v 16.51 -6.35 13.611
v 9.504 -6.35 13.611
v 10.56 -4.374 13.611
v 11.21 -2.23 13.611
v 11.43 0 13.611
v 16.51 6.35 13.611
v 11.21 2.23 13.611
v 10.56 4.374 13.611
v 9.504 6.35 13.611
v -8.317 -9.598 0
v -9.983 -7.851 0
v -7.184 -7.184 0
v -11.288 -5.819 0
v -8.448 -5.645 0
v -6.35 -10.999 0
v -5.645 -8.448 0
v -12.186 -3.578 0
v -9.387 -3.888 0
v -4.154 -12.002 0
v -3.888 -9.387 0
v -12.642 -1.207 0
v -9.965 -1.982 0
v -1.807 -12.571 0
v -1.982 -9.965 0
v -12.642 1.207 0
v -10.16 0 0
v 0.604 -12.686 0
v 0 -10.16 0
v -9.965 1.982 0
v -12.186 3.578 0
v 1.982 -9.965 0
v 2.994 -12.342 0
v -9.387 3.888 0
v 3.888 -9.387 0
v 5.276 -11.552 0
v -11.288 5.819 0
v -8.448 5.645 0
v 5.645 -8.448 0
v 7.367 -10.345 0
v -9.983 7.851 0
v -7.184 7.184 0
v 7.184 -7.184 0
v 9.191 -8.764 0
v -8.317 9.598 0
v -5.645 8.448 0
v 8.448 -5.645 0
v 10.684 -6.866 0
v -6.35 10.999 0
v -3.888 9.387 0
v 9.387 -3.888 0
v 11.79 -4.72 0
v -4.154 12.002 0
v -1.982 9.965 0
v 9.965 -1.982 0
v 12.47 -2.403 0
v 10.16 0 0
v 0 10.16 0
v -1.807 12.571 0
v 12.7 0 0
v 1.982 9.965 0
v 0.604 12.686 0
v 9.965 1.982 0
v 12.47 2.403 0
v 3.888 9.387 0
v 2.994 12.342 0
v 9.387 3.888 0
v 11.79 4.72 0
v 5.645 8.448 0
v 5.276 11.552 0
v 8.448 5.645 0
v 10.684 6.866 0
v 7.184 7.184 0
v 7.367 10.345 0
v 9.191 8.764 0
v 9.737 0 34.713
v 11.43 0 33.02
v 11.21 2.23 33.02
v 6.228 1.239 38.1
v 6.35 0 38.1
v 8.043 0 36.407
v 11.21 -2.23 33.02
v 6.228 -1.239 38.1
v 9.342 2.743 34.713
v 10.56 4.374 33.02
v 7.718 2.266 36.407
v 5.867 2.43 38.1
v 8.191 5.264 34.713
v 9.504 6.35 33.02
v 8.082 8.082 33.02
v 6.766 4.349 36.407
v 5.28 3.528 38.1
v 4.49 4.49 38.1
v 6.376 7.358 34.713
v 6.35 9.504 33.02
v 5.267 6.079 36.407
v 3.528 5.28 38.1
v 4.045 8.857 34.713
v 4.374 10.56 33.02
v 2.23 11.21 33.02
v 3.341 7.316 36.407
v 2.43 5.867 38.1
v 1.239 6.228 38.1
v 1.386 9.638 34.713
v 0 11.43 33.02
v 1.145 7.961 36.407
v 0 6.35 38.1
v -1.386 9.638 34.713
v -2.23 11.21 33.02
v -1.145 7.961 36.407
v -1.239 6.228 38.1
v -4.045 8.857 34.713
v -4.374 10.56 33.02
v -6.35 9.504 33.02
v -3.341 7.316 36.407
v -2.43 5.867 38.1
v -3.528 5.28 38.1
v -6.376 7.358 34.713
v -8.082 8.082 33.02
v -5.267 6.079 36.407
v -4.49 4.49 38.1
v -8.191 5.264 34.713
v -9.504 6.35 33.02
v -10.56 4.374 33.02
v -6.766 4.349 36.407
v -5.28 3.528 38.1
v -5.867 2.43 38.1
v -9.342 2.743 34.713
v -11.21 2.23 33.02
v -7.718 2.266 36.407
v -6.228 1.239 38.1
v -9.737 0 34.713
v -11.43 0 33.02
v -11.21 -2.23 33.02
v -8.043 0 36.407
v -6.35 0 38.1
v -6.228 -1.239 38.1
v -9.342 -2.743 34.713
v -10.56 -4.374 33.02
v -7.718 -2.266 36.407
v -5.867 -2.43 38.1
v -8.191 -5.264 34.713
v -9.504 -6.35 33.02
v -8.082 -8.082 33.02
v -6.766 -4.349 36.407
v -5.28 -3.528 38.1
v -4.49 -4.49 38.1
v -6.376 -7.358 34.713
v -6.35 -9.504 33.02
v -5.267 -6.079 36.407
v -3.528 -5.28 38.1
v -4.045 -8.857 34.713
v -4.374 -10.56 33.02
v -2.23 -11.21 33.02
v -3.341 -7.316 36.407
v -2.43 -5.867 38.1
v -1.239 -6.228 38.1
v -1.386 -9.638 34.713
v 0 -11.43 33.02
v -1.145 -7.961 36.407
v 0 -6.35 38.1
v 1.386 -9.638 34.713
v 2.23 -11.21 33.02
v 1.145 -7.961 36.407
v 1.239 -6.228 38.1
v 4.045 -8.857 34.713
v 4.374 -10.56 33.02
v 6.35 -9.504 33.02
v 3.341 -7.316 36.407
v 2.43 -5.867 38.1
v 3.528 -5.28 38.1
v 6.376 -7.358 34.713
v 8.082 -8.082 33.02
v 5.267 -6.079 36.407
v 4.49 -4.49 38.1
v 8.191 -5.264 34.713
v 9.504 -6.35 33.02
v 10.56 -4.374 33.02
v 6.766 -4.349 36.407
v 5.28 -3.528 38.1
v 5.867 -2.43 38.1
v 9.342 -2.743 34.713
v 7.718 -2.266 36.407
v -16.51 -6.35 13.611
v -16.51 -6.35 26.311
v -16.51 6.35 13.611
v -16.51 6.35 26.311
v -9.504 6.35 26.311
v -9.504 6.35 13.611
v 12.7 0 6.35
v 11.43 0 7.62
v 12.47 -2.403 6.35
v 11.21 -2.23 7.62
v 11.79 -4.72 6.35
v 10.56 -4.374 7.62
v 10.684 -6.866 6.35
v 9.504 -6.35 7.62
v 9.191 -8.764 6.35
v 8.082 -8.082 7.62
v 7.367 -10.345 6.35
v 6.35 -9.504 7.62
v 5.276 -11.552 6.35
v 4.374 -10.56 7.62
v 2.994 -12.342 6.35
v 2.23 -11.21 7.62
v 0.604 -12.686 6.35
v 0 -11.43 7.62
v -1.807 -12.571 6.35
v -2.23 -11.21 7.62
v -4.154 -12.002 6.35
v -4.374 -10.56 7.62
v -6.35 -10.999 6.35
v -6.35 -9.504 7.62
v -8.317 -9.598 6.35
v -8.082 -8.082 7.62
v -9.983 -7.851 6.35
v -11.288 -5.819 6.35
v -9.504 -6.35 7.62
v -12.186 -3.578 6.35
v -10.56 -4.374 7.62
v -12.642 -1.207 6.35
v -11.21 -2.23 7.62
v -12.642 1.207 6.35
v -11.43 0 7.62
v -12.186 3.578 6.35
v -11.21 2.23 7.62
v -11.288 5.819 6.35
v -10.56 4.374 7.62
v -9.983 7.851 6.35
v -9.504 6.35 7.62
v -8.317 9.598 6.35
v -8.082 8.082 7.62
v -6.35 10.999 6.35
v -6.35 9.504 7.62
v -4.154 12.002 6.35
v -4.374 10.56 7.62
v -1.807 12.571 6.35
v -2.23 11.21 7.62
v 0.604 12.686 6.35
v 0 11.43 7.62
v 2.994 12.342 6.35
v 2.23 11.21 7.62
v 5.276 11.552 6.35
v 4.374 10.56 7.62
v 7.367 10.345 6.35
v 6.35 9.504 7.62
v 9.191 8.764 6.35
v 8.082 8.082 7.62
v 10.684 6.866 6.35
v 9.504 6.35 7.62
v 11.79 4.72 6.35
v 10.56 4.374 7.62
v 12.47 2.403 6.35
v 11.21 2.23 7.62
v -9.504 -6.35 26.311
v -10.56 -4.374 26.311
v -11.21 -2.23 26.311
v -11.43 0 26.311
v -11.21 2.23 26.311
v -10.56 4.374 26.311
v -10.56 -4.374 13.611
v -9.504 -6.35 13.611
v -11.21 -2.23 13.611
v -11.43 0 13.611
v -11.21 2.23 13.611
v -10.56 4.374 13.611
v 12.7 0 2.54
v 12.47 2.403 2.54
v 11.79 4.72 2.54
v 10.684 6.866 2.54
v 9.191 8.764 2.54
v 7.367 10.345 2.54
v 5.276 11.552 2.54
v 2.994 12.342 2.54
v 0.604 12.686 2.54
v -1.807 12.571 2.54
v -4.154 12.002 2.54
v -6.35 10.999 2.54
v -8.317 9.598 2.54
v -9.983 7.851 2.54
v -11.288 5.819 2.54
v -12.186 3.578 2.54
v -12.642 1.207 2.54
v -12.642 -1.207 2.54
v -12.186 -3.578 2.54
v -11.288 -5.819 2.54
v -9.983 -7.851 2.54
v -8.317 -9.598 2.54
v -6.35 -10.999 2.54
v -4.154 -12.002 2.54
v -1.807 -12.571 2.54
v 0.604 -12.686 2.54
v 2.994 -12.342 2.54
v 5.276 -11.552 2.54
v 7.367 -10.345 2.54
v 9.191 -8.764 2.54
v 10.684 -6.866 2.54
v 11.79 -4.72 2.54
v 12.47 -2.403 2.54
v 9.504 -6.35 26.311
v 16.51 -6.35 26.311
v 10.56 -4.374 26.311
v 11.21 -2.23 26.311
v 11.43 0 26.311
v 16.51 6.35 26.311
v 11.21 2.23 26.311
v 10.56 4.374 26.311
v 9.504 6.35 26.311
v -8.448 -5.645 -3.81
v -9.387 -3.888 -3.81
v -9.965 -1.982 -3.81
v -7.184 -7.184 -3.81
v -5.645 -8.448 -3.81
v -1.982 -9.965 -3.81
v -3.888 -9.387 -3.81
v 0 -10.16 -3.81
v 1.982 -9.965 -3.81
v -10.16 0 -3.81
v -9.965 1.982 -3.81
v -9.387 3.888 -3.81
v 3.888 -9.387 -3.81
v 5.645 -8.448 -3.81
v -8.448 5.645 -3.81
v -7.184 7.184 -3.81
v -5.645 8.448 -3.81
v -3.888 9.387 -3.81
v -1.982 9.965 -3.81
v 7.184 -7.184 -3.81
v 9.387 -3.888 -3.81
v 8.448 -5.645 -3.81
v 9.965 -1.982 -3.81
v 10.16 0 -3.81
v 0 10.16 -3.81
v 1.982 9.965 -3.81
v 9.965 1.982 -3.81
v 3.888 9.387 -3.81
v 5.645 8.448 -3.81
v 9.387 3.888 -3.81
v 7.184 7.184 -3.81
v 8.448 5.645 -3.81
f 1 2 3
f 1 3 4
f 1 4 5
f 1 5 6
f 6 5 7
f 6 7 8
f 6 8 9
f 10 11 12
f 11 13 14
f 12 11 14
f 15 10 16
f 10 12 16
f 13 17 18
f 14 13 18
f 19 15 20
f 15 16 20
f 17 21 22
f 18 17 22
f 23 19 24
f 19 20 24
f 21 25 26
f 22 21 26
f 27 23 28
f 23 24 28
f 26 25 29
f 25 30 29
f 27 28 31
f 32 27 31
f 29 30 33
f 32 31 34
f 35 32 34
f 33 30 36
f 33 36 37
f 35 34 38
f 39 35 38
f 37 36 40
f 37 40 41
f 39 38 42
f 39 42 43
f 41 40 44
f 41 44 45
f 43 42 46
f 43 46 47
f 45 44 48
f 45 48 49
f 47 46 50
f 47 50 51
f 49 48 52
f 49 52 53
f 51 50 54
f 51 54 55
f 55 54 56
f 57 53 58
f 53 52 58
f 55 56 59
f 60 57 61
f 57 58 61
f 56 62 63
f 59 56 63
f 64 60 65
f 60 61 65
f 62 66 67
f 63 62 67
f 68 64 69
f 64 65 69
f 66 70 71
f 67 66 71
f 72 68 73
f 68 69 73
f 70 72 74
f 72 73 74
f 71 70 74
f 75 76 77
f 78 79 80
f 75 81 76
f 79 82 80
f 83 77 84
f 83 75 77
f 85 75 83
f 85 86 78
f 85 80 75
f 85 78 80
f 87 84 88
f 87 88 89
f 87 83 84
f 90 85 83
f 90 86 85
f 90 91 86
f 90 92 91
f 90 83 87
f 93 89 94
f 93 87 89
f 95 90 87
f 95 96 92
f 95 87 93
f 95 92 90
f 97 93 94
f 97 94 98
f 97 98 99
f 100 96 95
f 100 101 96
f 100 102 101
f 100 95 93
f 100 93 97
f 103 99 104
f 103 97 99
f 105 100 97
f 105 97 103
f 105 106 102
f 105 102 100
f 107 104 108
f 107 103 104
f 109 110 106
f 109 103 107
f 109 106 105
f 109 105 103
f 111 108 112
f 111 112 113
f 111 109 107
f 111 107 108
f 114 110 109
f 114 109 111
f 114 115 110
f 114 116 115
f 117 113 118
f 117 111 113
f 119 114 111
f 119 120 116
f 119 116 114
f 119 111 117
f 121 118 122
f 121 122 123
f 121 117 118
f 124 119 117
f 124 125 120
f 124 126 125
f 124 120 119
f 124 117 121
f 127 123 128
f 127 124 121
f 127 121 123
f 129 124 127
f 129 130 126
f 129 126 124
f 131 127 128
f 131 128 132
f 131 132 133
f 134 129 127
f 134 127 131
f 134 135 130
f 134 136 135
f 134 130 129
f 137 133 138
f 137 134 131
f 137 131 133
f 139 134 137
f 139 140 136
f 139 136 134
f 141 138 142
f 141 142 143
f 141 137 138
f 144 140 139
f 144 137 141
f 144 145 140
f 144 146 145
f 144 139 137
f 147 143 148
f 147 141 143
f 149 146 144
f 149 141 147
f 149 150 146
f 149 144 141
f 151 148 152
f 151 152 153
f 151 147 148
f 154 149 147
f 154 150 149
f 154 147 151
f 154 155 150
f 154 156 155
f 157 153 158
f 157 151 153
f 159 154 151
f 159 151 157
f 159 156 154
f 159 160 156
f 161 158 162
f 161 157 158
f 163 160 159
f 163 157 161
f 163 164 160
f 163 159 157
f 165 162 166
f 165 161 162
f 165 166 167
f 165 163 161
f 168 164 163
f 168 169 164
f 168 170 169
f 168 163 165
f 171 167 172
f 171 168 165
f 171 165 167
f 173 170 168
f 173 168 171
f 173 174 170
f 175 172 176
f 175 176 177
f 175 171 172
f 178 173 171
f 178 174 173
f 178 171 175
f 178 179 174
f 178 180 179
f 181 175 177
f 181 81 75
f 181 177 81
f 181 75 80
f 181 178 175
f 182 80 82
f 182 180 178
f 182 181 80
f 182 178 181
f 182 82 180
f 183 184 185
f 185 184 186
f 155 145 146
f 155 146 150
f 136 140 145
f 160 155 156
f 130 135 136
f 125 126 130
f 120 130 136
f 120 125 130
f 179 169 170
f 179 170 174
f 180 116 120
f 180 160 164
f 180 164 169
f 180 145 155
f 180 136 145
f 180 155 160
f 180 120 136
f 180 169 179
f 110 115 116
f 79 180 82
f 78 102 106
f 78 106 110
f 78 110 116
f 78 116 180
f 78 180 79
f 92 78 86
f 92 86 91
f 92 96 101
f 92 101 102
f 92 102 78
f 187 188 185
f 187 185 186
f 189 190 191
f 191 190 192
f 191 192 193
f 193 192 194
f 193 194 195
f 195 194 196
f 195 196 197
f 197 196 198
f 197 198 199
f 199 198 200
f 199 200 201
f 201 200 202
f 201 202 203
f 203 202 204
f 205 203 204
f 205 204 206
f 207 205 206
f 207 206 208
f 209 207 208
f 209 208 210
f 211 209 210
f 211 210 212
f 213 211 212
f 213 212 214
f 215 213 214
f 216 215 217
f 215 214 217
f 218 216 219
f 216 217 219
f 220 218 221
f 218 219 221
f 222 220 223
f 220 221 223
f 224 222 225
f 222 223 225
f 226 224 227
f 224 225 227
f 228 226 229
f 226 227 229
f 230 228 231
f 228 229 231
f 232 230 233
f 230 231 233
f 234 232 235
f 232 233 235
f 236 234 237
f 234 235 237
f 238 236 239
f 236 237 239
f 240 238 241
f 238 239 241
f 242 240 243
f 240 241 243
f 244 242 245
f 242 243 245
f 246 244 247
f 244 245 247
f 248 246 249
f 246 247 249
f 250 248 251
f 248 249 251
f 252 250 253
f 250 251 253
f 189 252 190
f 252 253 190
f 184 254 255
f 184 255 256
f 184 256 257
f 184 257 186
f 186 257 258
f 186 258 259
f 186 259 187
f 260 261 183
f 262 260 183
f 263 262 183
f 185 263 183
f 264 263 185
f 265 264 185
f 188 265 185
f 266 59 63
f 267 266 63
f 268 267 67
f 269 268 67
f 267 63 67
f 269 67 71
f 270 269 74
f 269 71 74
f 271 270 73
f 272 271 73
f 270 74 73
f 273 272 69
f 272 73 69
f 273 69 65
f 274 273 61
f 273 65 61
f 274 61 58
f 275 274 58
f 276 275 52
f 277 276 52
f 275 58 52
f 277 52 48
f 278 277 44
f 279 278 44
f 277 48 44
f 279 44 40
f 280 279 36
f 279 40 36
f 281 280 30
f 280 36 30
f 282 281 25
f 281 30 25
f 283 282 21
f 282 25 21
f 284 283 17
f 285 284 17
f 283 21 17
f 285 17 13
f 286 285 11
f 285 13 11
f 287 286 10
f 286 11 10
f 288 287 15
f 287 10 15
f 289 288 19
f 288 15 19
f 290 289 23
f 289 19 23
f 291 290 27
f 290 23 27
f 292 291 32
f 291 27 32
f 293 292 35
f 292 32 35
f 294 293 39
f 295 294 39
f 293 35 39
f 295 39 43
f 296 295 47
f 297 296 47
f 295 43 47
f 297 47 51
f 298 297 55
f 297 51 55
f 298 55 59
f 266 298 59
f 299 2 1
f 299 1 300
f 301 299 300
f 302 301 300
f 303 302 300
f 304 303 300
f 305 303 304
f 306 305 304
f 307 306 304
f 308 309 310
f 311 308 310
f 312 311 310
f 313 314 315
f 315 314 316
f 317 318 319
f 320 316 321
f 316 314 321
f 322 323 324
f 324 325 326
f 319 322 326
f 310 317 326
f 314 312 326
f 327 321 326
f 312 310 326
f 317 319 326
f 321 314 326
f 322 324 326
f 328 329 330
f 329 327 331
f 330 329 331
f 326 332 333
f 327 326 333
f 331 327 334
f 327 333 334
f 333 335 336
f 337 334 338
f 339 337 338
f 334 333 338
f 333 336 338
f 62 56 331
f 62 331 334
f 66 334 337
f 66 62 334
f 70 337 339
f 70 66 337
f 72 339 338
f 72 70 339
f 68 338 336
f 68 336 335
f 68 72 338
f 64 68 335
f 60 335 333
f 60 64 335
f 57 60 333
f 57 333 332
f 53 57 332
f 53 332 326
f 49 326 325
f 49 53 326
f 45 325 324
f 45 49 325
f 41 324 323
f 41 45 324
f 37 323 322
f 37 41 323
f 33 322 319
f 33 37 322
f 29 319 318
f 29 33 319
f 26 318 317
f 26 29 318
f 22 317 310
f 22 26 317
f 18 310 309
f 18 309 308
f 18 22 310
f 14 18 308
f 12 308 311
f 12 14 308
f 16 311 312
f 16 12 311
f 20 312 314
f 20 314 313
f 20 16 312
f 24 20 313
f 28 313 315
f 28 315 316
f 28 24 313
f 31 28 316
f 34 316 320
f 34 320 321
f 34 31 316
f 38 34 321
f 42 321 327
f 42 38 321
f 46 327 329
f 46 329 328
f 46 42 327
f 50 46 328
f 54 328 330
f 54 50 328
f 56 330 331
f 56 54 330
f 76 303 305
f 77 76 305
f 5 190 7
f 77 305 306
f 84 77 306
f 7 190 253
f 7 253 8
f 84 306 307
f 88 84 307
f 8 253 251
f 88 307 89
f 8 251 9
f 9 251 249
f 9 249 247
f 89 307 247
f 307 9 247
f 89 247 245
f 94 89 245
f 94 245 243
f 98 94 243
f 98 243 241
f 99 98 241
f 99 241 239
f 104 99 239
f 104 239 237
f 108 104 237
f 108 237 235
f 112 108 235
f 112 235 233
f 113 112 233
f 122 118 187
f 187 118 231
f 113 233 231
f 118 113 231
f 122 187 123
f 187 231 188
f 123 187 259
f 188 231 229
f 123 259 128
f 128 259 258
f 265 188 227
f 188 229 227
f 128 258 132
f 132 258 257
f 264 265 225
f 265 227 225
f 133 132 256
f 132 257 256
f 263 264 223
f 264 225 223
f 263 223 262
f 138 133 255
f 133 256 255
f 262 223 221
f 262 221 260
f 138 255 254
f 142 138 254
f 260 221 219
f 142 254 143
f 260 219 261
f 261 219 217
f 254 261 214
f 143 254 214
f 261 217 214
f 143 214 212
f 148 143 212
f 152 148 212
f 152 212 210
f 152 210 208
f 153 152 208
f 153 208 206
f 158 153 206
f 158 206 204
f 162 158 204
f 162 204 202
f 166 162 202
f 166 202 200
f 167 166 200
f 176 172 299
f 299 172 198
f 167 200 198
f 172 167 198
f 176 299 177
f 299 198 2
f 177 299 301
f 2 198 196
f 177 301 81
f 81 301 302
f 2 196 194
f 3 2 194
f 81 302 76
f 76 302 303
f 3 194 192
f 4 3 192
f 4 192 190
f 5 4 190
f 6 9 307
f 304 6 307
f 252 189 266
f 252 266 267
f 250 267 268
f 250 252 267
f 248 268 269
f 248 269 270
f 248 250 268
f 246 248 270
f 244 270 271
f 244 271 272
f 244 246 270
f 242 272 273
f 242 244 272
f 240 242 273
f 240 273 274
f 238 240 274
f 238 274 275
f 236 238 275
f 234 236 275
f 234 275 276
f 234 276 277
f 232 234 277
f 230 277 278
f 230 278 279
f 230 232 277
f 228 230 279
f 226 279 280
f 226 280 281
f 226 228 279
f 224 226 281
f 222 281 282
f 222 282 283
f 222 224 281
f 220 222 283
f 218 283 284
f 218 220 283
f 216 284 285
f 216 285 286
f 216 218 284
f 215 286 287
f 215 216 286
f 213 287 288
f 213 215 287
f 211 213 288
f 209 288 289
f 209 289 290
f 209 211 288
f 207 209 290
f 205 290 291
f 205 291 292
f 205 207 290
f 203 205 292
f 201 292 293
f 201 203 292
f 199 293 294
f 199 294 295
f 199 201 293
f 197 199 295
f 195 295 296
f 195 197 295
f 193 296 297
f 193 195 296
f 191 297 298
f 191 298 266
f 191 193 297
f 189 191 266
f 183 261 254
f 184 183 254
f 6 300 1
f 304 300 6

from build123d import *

# Parameters (mm, degrees)
F0_R        = 10.16
F1_DEPTH    = 3.81
F2_R        = 12.7
F3_DEPTH    = 2.54
F4_R        = 11.43
F5_DEPTH    = 38.1
F6_S5_R     = 12.7
F6_T6_DEPTH = 25
F7_W        = 12.7
F7_H        = 12.7
F8_DEPTH    = 16.51
F9_W        = 12.7
F9_H        = 12.7
F10_DEPTH   = 16.51


# Not quite as in the source:
# - a fillet or chamfer that OpenCascade refuses, or shapes differently, is made with other operations: its cross-section is extruded or revolved along the edge and cut away or added


with BuildPart() as f1:
    # F0 (on Top) → F1 (new body)
    with BuildSketch(Plane.XY):
        Circle(F0_R)
    extrude(amount=-F1_DEPTH)

    # F2 (on Top) → F3 (join)
    with BuildSketch(Plane.XY):
        Circle(F2_R)
    extrude(amount=F3_DEPTH)

    # F4 (on Top) → F5 (join)
    with BuildSketch(Plane.XY):
        Circle(F4_R)
    extrude(amount=F5_DEPTH)

    # F6: chamfer of 5.08 on 3 edges, made by hand


with BuildPart() as f6_tool2:
    # F6_s3 → F6_t4 (revolve)
    with BuildSketch(Plane.XZ):
        Polygon((16.51, 2.54), (11.43, 7.62), (11.43, 2.54), align=None)
    revolve(axis=Axis((0, 0, 2.54), (0, 0, -1)))

    # F6_s5 → F6_t6 (intersect, symmetric)
    with BuildSketch(Plane.XY.offset(5.1)):
        Circle(F6_S5_R)
    extrude(amount=F6_T6_DEPTH, both=True, mode=Mode.INTERSECT)


with BuildPart() as f1_1:
    add(f1.part)

    # F6_t1: union F6_tool2
    add(f6_tool2.part)

    # F6_s7 → F6_t8 (revolve, cut)
    with BuildSketch(Plane.XZ):
        Polygon((11.43, 33.02), (6.35, 38.1), (11.43, 38.1), align=None)
    revolve(axis=Axis((0, 0, 38.1), (0, 0, 1)), mode=Mode.SUBTRACT)

    # F7 (on Right) → F8 (join)
    with BuildSketch(Plane.YZ):
        with Locations((0, 19.9612583965)):
            Rectangle(F7_W, F7_H)
    extrude(amount=F8_DEPTH)

    # F9 (on Right) → F10 (join)
    with BuildSketch(Plane.YZ):
        with Locations((0, 19.9612583965)):
            Rectangle(F9_W, F9_H)
    extrude(amount=-F10_DEPTH)


solid = f1_1.part
